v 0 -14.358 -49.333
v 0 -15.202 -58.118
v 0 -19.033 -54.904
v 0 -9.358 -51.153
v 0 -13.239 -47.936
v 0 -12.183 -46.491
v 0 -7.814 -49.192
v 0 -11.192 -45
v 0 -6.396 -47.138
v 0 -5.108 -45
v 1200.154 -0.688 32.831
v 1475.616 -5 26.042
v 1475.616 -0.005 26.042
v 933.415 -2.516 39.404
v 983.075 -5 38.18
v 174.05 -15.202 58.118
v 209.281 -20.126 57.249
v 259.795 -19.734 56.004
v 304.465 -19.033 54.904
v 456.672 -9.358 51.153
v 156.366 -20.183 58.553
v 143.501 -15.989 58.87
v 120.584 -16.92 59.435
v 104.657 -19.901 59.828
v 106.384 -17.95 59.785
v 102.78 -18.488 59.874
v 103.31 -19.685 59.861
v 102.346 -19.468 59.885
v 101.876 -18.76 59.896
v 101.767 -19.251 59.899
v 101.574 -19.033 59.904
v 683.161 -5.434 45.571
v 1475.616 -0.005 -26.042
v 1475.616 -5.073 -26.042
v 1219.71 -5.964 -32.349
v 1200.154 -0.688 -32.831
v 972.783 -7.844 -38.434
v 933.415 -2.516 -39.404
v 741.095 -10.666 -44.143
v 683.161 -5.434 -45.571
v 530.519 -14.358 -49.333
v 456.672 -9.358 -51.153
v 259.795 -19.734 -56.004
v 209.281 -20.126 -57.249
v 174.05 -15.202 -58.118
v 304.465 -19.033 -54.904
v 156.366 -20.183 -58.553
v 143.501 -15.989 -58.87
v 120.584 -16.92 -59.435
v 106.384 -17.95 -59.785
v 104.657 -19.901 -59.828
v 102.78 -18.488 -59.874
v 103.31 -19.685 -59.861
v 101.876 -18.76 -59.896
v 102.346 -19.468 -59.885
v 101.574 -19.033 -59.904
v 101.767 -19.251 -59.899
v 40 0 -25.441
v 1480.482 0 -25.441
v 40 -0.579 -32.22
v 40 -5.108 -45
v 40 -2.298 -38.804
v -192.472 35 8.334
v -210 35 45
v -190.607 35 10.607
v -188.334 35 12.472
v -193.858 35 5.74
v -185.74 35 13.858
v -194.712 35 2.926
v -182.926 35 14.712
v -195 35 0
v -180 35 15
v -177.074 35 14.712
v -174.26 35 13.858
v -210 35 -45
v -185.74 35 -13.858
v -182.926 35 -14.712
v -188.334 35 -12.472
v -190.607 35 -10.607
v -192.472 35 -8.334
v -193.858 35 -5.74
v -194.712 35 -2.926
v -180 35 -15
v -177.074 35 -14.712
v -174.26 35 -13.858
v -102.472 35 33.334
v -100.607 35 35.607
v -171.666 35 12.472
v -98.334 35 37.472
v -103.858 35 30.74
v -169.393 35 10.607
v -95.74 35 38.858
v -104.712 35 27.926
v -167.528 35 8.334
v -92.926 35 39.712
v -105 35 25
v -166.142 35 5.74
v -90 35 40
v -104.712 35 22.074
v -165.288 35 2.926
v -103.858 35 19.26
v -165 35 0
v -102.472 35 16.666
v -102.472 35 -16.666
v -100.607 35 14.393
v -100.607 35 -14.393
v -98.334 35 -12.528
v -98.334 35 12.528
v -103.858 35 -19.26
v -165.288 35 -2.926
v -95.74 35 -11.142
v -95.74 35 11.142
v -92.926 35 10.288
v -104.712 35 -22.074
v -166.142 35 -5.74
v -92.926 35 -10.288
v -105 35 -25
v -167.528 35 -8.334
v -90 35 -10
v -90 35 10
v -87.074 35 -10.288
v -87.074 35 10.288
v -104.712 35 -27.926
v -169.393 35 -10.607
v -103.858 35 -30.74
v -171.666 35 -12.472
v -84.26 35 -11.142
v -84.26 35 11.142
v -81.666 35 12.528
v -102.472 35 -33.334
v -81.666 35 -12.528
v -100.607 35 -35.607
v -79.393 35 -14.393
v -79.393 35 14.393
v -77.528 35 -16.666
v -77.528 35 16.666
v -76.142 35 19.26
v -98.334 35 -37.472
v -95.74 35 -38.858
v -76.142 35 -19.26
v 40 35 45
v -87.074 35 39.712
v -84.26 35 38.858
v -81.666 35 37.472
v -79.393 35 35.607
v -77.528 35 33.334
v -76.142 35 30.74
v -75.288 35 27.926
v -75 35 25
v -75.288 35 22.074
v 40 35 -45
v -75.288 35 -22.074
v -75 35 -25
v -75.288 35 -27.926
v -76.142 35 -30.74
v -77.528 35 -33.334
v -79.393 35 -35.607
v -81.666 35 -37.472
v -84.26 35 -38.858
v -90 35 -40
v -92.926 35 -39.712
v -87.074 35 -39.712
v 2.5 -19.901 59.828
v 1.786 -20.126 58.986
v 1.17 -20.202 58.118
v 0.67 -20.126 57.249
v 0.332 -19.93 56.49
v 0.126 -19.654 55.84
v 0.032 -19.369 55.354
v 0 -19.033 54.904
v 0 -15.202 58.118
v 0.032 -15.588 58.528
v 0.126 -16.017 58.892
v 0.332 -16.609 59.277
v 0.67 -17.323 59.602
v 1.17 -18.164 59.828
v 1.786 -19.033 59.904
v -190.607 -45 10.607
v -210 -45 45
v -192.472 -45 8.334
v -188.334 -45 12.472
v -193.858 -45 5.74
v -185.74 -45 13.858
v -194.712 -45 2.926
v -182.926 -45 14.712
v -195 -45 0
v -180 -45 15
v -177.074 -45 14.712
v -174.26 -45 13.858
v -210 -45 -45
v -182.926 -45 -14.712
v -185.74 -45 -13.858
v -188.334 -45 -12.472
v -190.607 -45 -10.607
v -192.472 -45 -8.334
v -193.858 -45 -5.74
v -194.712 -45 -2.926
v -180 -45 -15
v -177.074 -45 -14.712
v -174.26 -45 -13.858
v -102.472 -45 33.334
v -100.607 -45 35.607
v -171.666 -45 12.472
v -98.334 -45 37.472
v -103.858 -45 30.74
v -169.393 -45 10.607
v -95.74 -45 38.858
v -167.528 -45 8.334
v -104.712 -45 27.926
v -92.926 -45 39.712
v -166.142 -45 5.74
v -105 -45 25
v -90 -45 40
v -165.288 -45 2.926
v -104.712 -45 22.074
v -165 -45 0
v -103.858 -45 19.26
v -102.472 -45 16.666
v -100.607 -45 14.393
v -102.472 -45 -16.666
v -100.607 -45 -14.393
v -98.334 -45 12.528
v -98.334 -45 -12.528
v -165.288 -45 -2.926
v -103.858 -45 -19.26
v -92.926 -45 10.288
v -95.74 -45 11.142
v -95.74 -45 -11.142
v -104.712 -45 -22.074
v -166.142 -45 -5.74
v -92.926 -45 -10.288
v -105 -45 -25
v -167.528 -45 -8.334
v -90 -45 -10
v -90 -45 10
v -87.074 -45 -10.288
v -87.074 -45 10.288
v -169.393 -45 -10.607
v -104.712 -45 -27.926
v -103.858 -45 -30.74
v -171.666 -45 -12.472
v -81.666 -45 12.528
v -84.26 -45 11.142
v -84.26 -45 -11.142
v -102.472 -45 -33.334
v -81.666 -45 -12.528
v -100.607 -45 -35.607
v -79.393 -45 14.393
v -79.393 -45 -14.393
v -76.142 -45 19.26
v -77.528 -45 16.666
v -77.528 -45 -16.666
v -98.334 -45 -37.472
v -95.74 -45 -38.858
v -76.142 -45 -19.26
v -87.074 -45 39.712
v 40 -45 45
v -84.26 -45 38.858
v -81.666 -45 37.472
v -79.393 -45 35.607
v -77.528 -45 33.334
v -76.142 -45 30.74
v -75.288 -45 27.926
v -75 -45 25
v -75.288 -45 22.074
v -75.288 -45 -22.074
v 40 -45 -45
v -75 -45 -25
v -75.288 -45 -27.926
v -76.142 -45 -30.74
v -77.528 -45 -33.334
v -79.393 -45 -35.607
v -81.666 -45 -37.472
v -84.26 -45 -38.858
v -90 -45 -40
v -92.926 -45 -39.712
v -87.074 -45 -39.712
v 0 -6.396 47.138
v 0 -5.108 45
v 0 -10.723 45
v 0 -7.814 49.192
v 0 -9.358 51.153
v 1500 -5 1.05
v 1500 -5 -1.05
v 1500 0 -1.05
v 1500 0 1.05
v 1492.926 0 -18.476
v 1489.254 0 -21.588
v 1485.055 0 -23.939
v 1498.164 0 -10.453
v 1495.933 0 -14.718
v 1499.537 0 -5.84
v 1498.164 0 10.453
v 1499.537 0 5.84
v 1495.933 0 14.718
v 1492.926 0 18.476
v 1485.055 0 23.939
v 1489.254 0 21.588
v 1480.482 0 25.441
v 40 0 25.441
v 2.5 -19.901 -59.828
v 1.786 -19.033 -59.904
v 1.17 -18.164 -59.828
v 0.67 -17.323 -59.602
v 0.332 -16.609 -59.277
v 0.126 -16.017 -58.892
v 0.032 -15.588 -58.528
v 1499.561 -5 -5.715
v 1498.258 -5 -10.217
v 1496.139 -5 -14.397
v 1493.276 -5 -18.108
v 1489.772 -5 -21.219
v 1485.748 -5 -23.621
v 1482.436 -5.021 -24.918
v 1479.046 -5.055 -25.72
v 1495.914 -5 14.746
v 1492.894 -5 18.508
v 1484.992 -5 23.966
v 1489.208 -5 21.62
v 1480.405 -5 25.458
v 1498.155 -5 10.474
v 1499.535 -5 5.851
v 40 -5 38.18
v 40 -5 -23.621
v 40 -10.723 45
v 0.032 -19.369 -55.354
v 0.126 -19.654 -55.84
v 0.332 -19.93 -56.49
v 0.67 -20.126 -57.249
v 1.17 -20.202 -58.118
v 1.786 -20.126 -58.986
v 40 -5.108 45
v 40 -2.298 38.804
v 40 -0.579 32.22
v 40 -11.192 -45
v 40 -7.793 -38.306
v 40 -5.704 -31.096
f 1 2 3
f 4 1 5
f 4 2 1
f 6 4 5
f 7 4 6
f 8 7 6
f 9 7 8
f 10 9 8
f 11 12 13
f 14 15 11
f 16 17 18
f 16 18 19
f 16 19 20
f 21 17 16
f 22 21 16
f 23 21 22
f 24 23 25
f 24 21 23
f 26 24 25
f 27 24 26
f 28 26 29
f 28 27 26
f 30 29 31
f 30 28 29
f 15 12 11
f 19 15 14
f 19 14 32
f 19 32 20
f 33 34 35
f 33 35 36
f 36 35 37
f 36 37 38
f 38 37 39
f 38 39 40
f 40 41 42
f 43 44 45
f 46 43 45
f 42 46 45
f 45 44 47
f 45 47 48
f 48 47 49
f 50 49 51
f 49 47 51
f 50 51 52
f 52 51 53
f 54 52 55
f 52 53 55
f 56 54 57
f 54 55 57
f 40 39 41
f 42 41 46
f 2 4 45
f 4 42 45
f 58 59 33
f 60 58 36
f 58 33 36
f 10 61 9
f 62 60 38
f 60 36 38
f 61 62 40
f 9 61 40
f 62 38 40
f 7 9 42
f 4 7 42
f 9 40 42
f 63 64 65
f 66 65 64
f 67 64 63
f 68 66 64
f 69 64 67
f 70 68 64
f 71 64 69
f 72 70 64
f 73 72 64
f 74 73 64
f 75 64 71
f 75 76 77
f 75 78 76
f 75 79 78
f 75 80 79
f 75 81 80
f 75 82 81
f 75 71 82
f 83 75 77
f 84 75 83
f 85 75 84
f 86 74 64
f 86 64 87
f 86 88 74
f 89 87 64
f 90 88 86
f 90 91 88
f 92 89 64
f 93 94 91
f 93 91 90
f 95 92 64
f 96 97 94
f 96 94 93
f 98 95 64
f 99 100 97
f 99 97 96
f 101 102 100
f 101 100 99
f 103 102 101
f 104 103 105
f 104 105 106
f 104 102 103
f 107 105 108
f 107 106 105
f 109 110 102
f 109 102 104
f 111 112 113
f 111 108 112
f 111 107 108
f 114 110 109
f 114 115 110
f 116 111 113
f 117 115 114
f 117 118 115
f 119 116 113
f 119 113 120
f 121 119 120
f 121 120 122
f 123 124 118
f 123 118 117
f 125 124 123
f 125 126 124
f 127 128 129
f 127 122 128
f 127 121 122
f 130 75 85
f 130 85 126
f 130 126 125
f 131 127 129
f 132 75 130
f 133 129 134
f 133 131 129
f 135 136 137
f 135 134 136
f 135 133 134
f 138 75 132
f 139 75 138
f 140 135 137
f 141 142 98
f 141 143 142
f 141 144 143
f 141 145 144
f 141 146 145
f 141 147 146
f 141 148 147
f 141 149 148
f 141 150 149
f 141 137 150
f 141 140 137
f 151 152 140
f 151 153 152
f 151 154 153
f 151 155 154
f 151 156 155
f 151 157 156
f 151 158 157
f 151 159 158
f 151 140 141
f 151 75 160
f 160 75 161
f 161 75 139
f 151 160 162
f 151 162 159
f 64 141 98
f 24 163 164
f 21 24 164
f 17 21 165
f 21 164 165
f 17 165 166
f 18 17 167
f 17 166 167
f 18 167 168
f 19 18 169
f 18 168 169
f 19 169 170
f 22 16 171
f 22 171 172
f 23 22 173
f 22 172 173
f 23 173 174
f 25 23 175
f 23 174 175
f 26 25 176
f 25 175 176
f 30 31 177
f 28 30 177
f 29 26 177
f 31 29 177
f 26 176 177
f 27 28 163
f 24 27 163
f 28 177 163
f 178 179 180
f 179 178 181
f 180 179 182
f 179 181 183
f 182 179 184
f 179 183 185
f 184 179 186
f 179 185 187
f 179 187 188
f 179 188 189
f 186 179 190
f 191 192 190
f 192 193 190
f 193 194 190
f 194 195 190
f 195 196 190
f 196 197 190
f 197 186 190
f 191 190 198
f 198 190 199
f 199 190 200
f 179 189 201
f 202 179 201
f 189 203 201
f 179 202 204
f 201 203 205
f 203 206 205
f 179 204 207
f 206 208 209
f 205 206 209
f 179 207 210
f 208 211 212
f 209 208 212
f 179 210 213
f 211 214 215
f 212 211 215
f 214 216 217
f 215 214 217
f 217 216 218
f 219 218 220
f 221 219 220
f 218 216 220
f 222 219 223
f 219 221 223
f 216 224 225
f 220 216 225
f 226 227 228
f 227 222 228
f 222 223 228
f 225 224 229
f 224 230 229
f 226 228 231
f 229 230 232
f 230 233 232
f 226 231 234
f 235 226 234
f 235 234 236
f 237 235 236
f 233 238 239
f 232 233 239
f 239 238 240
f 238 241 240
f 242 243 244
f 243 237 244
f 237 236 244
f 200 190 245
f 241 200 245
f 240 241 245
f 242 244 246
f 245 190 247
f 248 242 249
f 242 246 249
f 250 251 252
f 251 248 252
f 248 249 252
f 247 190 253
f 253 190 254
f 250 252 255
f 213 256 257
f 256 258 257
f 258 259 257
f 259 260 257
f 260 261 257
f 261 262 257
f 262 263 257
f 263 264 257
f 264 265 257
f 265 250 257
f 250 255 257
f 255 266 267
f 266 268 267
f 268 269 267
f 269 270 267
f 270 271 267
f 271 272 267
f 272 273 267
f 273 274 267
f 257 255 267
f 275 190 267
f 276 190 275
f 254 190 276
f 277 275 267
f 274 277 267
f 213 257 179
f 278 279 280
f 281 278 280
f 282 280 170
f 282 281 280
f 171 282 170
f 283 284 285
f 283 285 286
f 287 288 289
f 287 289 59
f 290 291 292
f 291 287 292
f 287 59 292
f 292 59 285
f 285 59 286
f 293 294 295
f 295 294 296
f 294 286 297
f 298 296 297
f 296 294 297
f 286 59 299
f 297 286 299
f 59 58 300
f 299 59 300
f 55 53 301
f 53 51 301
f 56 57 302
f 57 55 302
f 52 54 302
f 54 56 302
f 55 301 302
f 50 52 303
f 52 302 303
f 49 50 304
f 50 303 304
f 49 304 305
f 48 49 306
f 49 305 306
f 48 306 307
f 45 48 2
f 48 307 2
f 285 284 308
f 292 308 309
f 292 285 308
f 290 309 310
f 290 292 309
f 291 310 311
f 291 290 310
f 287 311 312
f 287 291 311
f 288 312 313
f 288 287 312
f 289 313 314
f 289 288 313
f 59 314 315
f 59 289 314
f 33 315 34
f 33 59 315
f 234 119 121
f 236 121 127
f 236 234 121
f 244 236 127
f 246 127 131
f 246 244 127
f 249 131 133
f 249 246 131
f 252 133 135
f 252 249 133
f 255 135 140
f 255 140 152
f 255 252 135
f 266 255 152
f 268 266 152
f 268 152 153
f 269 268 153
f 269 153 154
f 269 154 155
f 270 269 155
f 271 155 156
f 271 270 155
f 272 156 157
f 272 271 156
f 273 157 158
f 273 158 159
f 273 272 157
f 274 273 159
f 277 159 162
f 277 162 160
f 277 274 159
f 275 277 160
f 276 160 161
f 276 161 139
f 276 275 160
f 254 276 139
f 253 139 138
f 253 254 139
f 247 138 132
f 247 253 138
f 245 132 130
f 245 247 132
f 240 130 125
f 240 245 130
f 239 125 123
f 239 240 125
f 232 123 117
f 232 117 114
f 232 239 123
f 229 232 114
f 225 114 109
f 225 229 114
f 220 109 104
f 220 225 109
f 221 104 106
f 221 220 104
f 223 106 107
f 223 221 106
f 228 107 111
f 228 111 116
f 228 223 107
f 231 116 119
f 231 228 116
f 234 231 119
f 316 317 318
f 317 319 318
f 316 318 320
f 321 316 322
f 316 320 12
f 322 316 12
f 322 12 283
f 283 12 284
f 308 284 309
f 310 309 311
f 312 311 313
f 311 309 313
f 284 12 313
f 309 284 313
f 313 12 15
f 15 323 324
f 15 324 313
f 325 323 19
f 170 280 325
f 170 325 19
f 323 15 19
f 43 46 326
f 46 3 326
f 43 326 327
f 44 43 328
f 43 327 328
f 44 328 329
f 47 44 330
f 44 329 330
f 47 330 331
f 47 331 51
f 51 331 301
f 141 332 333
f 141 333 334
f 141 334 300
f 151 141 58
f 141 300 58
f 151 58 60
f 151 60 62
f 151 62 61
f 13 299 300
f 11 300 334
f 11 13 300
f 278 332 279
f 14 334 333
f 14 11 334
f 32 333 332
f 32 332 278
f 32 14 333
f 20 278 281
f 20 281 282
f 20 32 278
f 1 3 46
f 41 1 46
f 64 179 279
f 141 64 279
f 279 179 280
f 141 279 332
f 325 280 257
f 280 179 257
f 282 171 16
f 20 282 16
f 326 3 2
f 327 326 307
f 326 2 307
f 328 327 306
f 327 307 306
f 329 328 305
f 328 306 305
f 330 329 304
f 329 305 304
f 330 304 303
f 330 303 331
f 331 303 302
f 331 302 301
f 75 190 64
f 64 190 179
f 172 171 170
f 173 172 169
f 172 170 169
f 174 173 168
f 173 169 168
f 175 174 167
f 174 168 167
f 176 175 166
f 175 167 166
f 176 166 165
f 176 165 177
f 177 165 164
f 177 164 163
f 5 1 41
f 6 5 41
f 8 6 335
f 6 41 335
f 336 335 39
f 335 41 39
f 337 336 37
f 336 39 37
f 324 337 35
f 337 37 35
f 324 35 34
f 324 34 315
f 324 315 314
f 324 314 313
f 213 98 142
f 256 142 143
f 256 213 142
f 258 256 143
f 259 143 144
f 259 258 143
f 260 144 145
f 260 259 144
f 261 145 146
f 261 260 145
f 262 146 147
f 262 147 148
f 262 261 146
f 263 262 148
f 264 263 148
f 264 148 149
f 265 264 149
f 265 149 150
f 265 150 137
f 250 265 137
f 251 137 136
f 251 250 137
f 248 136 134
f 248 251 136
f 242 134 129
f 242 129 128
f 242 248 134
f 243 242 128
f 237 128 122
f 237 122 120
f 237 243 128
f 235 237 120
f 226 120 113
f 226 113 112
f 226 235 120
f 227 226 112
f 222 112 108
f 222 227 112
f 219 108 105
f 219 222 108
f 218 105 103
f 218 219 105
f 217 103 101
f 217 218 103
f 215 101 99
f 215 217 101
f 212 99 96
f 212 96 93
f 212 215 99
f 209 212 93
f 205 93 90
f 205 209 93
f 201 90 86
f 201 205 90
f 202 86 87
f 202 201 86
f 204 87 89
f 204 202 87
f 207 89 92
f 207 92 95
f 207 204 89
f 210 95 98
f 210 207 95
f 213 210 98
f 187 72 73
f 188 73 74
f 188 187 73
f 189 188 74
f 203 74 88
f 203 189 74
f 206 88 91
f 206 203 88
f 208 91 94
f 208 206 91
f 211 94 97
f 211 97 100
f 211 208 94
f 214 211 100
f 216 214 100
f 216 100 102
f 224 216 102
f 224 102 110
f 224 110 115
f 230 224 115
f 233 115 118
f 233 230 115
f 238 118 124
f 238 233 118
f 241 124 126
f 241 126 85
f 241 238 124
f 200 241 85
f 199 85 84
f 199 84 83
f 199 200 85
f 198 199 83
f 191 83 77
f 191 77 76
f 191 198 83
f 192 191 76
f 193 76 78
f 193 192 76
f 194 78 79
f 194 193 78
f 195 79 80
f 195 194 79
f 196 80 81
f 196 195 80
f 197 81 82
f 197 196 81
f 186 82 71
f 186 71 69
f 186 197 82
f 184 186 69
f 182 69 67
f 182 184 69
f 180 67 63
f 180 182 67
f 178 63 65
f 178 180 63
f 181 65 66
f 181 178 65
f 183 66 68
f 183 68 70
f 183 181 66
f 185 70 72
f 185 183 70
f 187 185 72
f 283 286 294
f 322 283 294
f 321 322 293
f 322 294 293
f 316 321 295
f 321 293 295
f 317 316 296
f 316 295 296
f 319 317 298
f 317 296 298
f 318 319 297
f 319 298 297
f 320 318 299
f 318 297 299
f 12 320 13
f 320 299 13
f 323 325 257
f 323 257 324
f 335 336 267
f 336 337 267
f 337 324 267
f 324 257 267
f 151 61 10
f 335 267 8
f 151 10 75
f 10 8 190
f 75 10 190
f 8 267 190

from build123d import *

# Parameters (mm, degrees)
BOSS_EXTRUDE1_DEPTH      = 1500
FILLET1_R                = 40
FILLET2_R                = 40
FILLET3_R                = 5
FILLET4_R                = 5
CUT_EXTRUDE1_DEPTH       = 1502.3316039943886
CUT_EXTRUDE1_DEPTH_BACK  = 1502.3316039943886
FILLET5_R                = 25
BOSS_EXTRUDE2_DEPTH      = 35
BOSS_EXTRUDE2_DEPTH_BACK = 45
SKETCH3_R                = 15.000000000000025
SKETCH3_R_2              = 14.999999999999998


with BuildPart() as part:
    # Sketch1 → Boss-Extrude1 (new body)
    with BuildSketch(Plane(origin=(0, 0, 0), x_dir=(0, 0, -1), z_dir=(1, 0, 0))):
        Polygon((0, 0), (40, 0), (61.94779998780638, -18.416390874921095), (58.733861939373675, -22.246613090515982), (38.18014882866898, -5), (0, -5), (-38.18014882866898, -5), (-58.733861939373675, -22.246613090515982), (-61.94779998780638, -18.416390874921095), (-40, 0), align=None)
    extrude(amount=BOSS_EXTRUDE1_DEPTH)

    # Fillet1
    fillet1_edges = [part.edges().sort_by_distance(p)[0] for p in [
        (750, -5, -38.18014882866898),
        (750, 0, 40),
    ]]
    fillet(fillet1_edges, radius=FILLET1_R)

    # Fillet2
    fillet2_edges = [part.edges().sort_by_distance(p)[0] for p in [
        (750, 0, -40),
    ]]
    fillet(fillet2_edges, radius=FILLET2_R)

    # Fillet3
    # the kernel refuses this fillet: 5 mm, written as the material it takes off along each edge
    with BuildSketch(Plane(origin=(0, -8.840835335933875, -69.98264510888814), x_dir=(0, 0.6427876096865403, 0.7660444431189772), z_dir=(0, -0.7660444431189772, 0.6427876096865403))) as fillet3_piece_1:
        with BuildLine():
            CenterArc((FILLET3_R, -FILLET3_R), FILLET3_R, 90, 90)
            Line((-2.28e-15, -FILLET3_R), (0, 0))
            Line((0, 0), (FILLET3_R, 0))
        make_face()
    extrude(amount=30.000000000000007, mode=Mode.SUBTRACT)
    with BuildSketch(Plane(origin=(-12.500000000000002, -18.4163908749211, -61.94779998780638), x_dir=(0, 0.6427876096865406, 0.7660444431189771), z_dir=(1, 0, 0))) as fillet3_piece_2:
        with BuildLine():
            CenterArc((FILLET3_R, FILLET3_R), FILLET3_R, 180, 90)
            Line((1.03e-15, FILLET3_R), (0, 0))
            Line((0, 0), (FILLET3_R, 2.8e-16))
        make_face()
    extrude(amount=1525, mode=Mode.SUBTRACT)
    with BuildSketch(Plane(origin=(-12.500000000000002, -22.246613090515982, -58.733861939373675), x_dir=(0, 0.7660444431189772, -0.6427876096865403), z_dir=(1, 0, 0))) as fillet3_piece_3:
        with BuildLine():
            CenterArc((FILLET3_R, FILLET3_R), FILLET3_R, 180, 90)
            Line((1.1e-16, FILLET3_R), (0, 0))
            Line((0, 0), (FILLET3_R, -6e-17))
        make_face()
    extrude(amount=1525, mode=Mode.SUBTRACT)
    with BuildSketch(Plane(origin=(1500, -8.840835335933875, -69.98264510888814), x_dir=(0, 0.6427876096865403, 0.7660444431189772), z_dir=(0, -0.7660444431189772, 0.6427876096865403))) as fillet3_piece_4:
        with BuildLine():
            CenterArc((FILLET3_R, FILLET3_R), FILLET3_R, 180, 90)
            Line((-2.28e-15, FILLET3_R), (0, 0))
            Line((0, 0), (FILLET3_R, 0))
        make_face()
    extrude(amount=30.000000000000007, mode=Mode.SUBTRACT)

    # Fillet4
    # the kernel refuses this fillet: 5 mm, written as the material it takes off along each edge
    with BuildSketch(Plane(origin=(0, -31.822168629503203, 50.69901681829192), x_dir=(0, 0.6427876096865403, -0.7660444431189772), z_dir=(0, 0.7660444431189772, 0.6427876096865403))) as fillet4_piece_1:
        with BuildLine():
            CenterArc((FILLET4_R, -FILLET4_R), FILLET4_R, 90, 90)
            Line((0, -FILLET4_R), (0, 0))
            Line((0, 0), (FILLET4_R, 0))
        make_face()
    extrude(amount=30.000000000000007, mode=Mode.SUBTRACT)
    with BuildSketch(Plane(origin=(-12.500000000000007, -22.246613090515982, 58.733861939373675), x_dir=(0, 0.7660444431189776, 0.6427876096865399), z_dir=(1, 0, 0))) as fillet4_piece_2:
        with BuildLine():
            CenterArc((FILLET4_R, -FILLET4_R), FILLET4_R, 90.00000000000004, 90)
            Line((5.38e-15, -FILLET4_R), (0, 0))
            Line((0, 0), (FILLET4_R, 2.4e-16))
        make_face()
    extrude(amount=1525, mode=Mode.SUBTRACT)
    with BuildSketch(Plane(origin=(-12.500000000000002, -18.416390874921095, 61.94779998780638), x_dir=(0, 0.6427876096865403, -0.7660444431189772), z_dir=(1, 0, 0))) as fillet4_piece_3:
        with BuildLine():
            CenterArc((FILLET4_R, -FILLET4_R), FILLET4_R, 90, 89.99999999999997)
            Line((2.28e-15, -FILLET4_R), (0, 0))
            Line((0, 0), (FILLET4_R, 1.1e-16))
        make_face()
    extrude(amount=1525, mode=Mode.SUBTRACT)
    with BuildSketch(Plane(origin=(1500, -31.822168629503203, 50.69901681829192), x_dir=(0, 0.6427876096865403, -0.7660444431189772), z_dir=(0, 0.7660444431189772, 0.6427876096865403))) as fillet4_piece_4:
        with BuildLine():
            CenterArc((FILLET4_R, FILLET4_R), FILLET4_R, 180, 90)
            Line((0, FILLET4_R), (0, 0))
            Line((0, 0), (FILLET4_R, 0))
        make_face()
    extrude(amount=30.000000000000007, mode=Mode.SUBTRACT)

    # Sketch2 → Cut-Extrude1 (cut, two sides: drawn at the far end of the back side and taken through both)
    with BuildSketch(Plane(origin=(0, 0, 0), x_dir=(1, 0, 0), z_dir=(0, 1, 0)).offset(-CUT_EXTRUDE1_DEPTH_BACK)):
        Polygon((1500, -59.90363972377879), (1500, -25.441190629351873), (101.5742667563142, -59.90363972377879), align=None)
        Polygon((1500, 59.90363972377879), (1500, 25.441190629351873), (101.57426675631426, 59.90363972377879), align=None)
    extrude(amount=CUT_EXTRUDE1_DEPTH + CUT_EXTRUDE1_DEPTH_BACK, mode=Mode.SUBTRACT)

    # Fillet5
    fillet5_edges = [part.edges().sort_by_distance(p)[0] for p in [
        (1500, -2.5207098367195613, -25.441190629351873),
        (1500, -2.5, 25.441190629351873),
    ]]
    fillet(fillet5_edges, radius=FILLET5_R)

    # Sketch3 → Boss-Extrude2 (add, two sides: drawn at the far end of the back side and taken through both)
    with BuildSketch(Plane(origin=(0, 0, 0), x_dir=(1, 0, 0), z_dir=(0, 1, 0)).offset(-BOSS_EXTRUDE2_DEPTH_BACK)):
        Polygon((39.99999999999999, 45.00000000000001), (-210, 44.99999999999998), (-210, -45.00000000000002), (40.00000000000001, -44.99999999999998), align=None)
        with Locations(Location((-180, -1.78e-15, 0), (0, 0, 270))):
            Circle(SKETCH3_R, mode=Mode.SUBTRACT)
        with Locations(Location((-90, 25, 0), (0, 0, 270))):
            Circle(SKETCH3_R_2, mode=Mode.SUBTRACT)
        with Locations(Location((-90, -25, 0), (0, 0, 270))):
            Circle(SKETCH3_R_2, mode=Mode.SUBTRACT)
    extrude(amount=BOSS_EXTRUDE2_DEPTH + BOSS_EXTRUDE2_DEPTH_BACK)


solid = part.part
